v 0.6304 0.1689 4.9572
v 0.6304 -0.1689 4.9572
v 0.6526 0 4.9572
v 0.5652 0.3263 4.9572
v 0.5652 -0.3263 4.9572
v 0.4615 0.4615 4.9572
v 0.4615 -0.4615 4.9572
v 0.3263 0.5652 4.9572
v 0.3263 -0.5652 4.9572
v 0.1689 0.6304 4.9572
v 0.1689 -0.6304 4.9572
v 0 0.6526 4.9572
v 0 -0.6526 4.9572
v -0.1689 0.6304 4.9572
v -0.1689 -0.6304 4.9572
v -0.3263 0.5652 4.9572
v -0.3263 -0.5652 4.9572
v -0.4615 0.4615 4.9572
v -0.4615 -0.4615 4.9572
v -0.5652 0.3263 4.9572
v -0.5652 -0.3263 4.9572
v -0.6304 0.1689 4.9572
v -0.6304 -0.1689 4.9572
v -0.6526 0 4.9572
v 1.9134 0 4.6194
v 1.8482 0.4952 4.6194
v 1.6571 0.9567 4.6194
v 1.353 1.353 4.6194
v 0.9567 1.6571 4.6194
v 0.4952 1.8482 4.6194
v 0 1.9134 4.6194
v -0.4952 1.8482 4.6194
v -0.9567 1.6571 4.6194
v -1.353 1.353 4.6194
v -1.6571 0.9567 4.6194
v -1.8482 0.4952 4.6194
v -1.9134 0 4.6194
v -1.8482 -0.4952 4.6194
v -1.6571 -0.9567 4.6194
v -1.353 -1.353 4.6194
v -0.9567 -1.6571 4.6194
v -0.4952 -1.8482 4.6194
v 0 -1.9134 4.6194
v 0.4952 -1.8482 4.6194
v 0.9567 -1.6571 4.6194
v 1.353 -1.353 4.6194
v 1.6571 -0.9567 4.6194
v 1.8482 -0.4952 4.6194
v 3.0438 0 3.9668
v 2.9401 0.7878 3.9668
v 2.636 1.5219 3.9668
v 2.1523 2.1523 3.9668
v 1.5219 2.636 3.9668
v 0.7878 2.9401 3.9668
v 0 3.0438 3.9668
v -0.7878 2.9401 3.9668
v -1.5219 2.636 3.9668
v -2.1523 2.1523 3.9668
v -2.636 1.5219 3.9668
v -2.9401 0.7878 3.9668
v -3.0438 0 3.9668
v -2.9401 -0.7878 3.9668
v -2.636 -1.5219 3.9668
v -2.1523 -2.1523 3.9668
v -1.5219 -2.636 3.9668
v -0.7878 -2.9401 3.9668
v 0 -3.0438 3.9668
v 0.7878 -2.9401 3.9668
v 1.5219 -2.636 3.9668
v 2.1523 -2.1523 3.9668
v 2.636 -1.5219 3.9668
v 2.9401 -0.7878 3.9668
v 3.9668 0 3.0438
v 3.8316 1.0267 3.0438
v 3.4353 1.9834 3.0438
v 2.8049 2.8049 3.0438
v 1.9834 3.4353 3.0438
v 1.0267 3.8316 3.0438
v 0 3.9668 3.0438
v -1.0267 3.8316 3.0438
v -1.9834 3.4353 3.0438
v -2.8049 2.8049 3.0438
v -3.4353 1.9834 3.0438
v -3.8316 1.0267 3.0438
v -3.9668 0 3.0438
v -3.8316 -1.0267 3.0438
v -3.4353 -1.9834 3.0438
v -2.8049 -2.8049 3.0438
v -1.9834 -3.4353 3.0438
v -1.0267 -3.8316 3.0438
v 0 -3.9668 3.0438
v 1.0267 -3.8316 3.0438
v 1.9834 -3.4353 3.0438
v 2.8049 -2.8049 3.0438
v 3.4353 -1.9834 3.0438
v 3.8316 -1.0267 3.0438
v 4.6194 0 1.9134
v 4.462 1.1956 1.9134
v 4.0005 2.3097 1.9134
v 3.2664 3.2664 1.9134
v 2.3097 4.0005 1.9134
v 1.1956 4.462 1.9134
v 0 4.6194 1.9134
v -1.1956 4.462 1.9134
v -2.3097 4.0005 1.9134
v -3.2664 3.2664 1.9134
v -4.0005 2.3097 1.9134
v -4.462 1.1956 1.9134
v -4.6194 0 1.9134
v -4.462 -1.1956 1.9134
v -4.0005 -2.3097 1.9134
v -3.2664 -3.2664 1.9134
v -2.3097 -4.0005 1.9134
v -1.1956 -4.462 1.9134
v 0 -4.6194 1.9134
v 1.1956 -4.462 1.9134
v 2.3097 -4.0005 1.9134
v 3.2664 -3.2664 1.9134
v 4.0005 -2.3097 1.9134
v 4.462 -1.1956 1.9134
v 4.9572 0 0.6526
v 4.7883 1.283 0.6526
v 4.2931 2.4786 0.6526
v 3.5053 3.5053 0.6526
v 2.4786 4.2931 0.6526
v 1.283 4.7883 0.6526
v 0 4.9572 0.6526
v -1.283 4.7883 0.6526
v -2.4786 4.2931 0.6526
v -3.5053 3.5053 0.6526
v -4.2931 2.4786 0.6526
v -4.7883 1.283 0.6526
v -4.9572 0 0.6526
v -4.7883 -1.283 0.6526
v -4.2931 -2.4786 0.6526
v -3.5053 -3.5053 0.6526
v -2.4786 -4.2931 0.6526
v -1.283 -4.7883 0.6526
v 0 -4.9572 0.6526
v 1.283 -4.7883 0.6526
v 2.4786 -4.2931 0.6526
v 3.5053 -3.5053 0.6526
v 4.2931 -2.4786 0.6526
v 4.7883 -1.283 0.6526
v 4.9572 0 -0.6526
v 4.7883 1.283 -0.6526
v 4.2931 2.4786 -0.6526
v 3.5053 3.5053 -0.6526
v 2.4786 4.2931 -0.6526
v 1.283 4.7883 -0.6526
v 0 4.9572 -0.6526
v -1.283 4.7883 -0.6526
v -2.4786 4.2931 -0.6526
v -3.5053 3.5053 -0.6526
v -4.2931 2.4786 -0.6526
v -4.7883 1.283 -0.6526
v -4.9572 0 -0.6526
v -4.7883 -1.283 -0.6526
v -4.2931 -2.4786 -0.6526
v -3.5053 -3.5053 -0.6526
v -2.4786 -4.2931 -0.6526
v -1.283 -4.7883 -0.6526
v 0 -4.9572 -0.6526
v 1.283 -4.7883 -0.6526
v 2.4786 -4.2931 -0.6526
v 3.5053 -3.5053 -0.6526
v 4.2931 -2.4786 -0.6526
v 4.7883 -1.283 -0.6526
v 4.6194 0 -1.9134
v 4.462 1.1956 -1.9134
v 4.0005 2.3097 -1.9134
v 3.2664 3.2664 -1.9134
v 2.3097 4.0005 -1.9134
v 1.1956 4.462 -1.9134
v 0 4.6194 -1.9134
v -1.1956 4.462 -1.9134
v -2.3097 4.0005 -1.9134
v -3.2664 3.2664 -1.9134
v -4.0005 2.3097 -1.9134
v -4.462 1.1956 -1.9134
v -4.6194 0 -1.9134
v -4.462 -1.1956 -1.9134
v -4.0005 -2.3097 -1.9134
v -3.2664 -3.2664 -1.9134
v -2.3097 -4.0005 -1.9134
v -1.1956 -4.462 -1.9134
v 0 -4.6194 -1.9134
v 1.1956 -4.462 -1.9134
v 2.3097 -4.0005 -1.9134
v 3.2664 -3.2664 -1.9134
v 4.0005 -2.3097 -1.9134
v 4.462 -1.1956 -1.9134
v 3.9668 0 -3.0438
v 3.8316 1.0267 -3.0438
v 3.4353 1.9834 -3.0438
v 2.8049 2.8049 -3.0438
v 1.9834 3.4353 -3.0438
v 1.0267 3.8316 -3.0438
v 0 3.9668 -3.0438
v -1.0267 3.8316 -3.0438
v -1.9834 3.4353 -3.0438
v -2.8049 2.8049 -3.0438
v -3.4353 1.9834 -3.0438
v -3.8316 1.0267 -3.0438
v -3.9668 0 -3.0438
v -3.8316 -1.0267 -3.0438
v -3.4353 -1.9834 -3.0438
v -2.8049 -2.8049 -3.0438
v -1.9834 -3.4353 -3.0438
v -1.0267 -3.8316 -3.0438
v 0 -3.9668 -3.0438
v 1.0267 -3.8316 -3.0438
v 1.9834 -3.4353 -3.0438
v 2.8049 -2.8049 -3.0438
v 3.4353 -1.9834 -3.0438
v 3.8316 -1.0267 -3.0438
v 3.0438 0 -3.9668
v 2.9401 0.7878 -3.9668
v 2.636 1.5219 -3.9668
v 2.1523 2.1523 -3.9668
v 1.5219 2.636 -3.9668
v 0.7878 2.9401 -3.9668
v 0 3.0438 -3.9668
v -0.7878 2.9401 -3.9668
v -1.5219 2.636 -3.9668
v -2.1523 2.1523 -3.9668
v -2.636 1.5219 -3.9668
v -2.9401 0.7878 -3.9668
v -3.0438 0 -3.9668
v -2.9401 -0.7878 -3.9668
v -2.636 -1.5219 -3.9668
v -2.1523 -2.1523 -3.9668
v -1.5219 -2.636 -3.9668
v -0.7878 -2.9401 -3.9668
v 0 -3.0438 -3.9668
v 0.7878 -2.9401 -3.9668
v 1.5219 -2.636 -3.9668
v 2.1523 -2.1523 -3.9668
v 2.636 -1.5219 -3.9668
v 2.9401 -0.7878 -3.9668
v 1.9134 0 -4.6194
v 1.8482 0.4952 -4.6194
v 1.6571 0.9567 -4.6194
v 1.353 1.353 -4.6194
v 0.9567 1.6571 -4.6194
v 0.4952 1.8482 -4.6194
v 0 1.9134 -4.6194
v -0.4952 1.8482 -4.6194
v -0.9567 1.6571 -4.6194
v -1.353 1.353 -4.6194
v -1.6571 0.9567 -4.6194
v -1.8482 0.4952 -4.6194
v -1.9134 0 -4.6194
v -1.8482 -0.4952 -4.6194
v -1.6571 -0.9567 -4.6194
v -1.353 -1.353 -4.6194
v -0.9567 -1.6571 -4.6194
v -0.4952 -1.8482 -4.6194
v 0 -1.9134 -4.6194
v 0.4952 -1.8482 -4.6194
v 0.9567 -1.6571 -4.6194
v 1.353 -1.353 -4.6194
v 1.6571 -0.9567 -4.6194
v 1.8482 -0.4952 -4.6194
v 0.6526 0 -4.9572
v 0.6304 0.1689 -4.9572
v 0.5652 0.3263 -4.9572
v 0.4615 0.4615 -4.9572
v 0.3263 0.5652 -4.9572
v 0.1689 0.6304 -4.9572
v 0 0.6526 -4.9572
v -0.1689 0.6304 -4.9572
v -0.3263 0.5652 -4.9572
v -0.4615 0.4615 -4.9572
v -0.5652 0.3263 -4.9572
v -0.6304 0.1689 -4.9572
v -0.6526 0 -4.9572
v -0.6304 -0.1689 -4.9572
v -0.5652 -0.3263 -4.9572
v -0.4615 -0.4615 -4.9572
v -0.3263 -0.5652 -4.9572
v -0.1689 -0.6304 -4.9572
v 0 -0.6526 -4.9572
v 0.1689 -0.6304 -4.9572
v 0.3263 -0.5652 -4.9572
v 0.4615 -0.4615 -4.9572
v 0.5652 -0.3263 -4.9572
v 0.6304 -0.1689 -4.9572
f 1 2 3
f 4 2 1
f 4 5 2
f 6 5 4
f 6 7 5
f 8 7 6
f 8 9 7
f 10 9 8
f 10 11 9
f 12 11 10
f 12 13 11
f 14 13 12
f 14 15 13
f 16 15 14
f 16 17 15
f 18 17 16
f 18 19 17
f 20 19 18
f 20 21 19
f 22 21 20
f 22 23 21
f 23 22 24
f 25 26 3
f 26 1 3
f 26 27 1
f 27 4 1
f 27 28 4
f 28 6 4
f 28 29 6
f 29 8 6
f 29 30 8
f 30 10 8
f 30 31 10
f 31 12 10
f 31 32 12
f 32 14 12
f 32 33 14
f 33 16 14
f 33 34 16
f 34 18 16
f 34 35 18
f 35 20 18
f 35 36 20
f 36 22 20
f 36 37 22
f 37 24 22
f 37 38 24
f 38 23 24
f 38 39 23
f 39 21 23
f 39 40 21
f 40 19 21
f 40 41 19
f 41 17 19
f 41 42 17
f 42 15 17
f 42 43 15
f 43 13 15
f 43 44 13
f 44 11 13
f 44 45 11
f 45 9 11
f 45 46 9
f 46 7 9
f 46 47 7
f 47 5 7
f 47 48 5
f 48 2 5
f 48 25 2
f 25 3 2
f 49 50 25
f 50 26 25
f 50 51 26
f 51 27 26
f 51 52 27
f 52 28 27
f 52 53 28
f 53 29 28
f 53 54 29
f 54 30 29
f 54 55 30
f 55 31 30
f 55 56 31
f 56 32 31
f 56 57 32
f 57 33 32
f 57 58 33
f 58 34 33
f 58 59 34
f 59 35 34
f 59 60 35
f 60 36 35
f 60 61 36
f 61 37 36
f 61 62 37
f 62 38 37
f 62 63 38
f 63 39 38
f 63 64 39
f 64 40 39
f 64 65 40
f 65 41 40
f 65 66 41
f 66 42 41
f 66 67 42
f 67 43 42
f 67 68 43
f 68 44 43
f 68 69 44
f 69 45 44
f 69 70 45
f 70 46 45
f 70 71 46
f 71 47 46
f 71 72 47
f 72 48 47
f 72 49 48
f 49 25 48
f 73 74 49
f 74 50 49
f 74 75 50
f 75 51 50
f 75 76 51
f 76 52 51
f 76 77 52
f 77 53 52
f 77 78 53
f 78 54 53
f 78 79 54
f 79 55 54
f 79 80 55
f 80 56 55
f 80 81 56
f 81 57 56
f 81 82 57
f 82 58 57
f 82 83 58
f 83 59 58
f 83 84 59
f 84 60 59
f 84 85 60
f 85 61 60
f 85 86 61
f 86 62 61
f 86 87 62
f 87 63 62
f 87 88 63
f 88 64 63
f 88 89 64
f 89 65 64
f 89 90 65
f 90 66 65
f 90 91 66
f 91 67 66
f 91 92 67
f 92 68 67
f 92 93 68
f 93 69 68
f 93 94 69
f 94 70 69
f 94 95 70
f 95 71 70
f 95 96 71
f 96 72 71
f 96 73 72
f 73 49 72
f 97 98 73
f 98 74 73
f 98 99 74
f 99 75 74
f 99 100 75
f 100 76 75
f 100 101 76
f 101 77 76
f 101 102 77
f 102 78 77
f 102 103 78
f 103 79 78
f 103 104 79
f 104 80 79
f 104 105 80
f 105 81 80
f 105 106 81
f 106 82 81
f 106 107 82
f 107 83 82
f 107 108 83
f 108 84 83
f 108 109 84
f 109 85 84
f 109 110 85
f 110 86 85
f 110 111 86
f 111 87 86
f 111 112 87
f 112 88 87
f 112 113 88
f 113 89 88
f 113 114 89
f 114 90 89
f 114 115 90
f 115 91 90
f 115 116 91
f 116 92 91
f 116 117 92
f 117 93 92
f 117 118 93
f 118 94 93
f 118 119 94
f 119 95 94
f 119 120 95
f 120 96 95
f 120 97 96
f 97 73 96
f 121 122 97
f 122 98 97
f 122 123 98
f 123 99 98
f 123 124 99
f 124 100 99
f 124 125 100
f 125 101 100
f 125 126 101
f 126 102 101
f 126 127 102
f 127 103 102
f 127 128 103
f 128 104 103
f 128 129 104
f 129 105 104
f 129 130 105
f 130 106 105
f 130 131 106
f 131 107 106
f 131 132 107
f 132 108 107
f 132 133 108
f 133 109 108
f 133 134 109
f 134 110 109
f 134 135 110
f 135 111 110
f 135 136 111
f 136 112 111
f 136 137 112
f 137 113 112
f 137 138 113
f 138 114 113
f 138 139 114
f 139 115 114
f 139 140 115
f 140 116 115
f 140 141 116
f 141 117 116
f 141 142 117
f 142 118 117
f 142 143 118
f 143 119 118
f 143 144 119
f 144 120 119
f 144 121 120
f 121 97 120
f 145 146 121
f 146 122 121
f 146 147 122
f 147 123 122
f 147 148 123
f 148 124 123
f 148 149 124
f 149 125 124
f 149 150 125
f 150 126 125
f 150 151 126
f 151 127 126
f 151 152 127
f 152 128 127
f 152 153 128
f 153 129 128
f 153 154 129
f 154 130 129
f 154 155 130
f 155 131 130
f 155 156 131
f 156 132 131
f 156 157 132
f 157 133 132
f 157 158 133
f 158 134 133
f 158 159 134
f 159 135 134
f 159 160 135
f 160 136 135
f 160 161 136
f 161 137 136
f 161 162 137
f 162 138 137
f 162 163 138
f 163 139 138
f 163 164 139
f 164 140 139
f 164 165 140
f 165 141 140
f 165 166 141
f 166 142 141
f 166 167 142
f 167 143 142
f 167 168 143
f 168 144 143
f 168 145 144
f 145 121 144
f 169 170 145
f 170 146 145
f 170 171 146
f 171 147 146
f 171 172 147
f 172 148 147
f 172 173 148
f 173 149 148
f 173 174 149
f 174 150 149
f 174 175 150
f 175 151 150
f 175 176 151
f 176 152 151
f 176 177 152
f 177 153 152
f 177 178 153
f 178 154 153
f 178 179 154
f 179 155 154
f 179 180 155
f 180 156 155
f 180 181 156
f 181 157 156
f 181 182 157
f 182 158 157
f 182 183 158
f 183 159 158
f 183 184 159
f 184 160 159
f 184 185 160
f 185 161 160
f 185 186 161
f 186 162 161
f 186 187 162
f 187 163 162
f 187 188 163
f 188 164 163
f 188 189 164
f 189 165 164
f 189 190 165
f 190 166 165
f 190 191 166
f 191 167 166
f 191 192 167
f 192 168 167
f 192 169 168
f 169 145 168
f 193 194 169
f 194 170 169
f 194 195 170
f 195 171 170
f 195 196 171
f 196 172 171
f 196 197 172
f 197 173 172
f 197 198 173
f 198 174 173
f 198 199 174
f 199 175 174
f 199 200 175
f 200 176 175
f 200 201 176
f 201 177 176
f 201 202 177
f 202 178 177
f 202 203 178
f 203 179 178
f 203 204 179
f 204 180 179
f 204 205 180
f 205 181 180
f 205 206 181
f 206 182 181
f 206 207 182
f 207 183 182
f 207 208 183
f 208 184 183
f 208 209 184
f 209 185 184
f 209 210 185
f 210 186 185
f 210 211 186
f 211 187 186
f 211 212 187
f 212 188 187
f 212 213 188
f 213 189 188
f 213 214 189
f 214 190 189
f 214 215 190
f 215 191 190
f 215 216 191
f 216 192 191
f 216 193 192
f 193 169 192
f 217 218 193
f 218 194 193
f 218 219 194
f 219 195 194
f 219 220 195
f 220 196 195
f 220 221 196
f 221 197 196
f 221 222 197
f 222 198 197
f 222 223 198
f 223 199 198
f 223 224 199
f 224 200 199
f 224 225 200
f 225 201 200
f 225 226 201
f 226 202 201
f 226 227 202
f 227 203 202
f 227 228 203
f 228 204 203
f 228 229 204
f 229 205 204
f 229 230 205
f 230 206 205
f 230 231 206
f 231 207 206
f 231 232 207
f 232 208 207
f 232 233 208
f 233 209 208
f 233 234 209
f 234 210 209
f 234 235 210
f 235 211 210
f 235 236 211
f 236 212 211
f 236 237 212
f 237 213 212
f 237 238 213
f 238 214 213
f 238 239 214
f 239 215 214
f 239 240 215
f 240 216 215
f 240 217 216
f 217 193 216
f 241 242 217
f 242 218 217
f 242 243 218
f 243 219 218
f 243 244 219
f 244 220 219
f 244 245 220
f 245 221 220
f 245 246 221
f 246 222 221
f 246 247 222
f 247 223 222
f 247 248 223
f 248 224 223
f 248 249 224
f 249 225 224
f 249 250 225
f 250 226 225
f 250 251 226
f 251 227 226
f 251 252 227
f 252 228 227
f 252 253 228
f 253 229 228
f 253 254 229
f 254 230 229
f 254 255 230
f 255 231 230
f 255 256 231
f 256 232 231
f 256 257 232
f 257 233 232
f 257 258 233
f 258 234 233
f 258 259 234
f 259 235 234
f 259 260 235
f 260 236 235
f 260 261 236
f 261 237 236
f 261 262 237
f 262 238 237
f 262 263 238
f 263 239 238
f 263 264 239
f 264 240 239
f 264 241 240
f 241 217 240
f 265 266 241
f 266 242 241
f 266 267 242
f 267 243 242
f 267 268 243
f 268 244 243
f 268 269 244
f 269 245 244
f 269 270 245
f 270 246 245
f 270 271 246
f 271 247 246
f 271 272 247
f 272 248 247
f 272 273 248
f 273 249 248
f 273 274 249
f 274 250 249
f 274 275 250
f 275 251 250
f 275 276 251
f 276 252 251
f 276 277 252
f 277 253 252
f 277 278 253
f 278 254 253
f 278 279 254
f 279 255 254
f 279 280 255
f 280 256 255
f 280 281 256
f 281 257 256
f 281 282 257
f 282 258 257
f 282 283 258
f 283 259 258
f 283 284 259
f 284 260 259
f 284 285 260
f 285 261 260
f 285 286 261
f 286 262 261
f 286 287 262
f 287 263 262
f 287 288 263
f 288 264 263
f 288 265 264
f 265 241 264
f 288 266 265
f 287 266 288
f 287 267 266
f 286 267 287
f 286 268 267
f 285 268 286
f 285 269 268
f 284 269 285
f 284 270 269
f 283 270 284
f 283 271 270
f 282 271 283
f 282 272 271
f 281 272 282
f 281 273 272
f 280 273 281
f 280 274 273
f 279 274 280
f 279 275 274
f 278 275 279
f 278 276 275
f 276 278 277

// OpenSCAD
// Many Projects - Test Fixture: a second model at the folder's root.
sphere(r = 5, $fn = 24);
